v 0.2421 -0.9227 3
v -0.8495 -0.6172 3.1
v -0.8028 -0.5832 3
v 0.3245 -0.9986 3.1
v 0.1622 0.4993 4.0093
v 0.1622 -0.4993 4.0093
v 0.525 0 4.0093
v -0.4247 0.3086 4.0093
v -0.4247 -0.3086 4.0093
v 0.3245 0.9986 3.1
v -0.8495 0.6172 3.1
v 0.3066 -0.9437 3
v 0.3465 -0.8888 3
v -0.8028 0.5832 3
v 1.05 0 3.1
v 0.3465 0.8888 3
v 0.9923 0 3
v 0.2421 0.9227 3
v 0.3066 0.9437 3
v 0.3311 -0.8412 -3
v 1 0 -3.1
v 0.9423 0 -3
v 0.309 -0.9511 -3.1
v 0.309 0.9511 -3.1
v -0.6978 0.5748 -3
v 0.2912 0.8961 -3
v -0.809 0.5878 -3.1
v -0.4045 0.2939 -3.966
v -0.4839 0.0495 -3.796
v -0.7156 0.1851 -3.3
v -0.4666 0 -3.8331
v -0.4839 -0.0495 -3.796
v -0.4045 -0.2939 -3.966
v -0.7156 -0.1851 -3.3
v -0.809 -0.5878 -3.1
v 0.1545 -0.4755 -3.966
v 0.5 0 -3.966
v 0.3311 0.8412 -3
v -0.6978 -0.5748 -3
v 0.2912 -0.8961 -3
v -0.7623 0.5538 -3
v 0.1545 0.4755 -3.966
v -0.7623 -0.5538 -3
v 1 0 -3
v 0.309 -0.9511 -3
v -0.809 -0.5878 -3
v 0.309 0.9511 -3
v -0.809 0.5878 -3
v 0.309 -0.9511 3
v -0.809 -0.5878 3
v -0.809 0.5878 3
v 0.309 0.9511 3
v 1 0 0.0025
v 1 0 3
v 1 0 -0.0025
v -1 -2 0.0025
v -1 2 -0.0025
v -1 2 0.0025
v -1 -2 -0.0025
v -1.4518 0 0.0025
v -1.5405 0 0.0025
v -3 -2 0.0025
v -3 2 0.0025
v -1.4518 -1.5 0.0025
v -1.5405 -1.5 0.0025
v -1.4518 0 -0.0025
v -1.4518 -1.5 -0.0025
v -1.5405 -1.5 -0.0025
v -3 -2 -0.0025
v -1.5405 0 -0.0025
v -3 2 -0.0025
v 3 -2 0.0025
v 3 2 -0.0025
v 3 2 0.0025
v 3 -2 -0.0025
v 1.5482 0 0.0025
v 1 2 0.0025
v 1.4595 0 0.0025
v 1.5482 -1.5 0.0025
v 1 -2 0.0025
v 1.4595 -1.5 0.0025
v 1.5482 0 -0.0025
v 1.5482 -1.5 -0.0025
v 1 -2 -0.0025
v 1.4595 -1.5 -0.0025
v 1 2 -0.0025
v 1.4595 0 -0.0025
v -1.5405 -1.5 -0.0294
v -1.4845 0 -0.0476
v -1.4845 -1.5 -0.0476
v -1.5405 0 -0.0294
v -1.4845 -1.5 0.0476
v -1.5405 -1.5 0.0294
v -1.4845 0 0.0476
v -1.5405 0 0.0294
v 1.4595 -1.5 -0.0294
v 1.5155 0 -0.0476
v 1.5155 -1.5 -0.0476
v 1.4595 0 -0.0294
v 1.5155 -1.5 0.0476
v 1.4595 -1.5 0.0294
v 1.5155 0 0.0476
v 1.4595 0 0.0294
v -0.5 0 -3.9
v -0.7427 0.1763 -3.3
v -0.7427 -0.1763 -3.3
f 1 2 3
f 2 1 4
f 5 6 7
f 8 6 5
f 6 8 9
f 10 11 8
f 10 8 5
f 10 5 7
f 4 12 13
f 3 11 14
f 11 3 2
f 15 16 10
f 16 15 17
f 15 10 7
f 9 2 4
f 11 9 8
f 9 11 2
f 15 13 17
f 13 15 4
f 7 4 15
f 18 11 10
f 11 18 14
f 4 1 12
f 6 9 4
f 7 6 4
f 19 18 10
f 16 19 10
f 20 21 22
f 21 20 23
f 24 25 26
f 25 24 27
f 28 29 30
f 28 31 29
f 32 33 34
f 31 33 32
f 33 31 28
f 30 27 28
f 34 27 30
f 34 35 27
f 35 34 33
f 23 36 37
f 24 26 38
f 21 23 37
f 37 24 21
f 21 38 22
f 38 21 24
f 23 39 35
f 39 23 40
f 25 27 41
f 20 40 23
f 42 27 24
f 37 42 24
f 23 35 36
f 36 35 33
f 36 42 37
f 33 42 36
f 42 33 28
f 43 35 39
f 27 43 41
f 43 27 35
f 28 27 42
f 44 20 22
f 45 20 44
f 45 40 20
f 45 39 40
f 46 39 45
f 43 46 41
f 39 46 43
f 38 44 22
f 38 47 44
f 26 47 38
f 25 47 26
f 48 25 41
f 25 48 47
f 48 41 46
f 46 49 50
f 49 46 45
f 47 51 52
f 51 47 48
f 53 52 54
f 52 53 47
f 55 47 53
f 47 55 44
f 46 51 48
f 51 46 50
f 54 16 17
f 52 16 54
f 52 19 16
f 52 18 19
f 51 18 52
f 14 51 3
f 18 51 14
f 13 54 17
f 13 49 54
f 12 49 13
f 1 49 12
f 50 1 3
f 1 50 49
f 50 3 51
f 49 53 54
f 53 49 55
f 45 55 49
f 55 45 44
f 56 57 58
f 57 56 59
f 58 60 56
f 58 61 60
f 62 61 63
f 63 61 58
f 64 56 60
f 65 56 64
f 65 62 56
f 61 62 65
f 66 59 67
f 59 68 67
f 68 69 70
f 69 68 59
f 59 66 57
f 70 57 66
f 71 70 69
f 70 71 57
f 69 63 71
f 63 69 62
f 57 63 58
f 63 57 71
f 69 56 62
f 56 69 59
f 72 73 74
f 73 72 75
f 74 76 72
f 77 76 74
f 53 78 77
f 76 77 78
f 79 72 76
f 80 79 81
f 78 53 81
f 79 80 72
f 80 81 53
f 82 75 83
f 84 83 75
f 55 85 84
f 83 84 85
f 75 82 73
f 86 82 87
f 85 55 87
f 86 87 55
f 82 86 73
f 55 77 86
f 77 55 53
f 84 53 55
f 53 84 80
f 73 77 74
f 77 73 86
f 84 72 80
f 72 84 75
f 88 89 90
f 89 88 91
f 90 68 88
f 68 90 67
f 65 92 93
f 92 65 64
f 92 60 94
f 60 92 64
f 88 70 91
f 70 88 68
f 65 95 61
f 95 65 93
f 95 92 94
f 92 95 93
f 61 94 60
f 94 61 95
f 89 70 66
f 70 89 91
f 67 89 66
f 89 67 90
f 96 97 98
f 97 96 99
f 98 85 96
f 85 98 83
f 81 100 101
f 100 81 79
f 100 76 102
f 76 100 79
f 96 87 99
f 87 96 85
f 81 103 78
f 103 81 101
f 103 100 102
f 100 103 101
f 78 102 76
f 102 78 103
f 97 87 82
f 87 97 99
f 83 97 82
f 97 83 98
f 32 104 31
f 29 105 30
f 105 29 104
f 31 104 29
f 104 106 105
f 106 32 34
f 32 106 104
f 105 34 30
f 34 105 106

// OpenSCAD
// === Nave Espacial en OpenSCAD ===

module fuselaje() {
    translate([0, 0, 0])
        cylinder(h=6, r=1, center=true);
}

module escudo() {
    intersection() {
        translate([0, 0, 3.1])
            sphere(r=1.05);
        translate([-2, -2, 2.8])
            cube([4, 4, 2], center=false);
    }
}

module panel_izq() {
    translate([-2, 0, 0])
        scale([1, 2, 0.05])
            cube([2, 2, 0.1], center=true);
}

module panel_der() {
    translate([2, 0, 0])
        scale([1, 2, 0.05])
            cube([2, 2, 0.1], center=true);
}

module motor(x_offset) {
    translate([x_offset, 0, -3.3])
        rotate([180, 0, 0])
            cylinder(h=0.6, r1=0.3, r2=0);
}

// Antena parabólica (esfera invertida)
module antena() {
    difference() {
        translate([0, 0, 4])
            sphere(r=0.5);
        translate([-1, -1, 4])
            cube([2, 2, 2], center=false);
    }
}

// Soportes de paneles
module soporte_panel(x_offset) {
    translate([x_offset, 0, 0])
        rotate([90, 0, 0])
            cylinder(h=1.5, r=0.05);
}

// Cúpula trasera
module cupula() {
    intersection() {
        translate([0, 0, -3.1])
            sphere(r=1);
        translate([-2, -2, -5])
            cube([4, 4, 2], center=false);
    }
}

// Ensamblar todo
color([0.1, 0.1, 0.1]) fuselaje();
color([0.1, 0.1, 0.1]) escudo();
cupula();
panel_izq();
panel_der();
soporte_panel(-1.5);
soporte_panel(1.5);
motor(-0.5);
motor(0.5);
antena();


// Ensamblar todo
color([0.1, 0.1, 0.1]) fuselaje();
color([0.1, 0.1, 0.1]) escudo();
panel_izq();
panel_der();
motor(-0.5);
motor(0.5);
